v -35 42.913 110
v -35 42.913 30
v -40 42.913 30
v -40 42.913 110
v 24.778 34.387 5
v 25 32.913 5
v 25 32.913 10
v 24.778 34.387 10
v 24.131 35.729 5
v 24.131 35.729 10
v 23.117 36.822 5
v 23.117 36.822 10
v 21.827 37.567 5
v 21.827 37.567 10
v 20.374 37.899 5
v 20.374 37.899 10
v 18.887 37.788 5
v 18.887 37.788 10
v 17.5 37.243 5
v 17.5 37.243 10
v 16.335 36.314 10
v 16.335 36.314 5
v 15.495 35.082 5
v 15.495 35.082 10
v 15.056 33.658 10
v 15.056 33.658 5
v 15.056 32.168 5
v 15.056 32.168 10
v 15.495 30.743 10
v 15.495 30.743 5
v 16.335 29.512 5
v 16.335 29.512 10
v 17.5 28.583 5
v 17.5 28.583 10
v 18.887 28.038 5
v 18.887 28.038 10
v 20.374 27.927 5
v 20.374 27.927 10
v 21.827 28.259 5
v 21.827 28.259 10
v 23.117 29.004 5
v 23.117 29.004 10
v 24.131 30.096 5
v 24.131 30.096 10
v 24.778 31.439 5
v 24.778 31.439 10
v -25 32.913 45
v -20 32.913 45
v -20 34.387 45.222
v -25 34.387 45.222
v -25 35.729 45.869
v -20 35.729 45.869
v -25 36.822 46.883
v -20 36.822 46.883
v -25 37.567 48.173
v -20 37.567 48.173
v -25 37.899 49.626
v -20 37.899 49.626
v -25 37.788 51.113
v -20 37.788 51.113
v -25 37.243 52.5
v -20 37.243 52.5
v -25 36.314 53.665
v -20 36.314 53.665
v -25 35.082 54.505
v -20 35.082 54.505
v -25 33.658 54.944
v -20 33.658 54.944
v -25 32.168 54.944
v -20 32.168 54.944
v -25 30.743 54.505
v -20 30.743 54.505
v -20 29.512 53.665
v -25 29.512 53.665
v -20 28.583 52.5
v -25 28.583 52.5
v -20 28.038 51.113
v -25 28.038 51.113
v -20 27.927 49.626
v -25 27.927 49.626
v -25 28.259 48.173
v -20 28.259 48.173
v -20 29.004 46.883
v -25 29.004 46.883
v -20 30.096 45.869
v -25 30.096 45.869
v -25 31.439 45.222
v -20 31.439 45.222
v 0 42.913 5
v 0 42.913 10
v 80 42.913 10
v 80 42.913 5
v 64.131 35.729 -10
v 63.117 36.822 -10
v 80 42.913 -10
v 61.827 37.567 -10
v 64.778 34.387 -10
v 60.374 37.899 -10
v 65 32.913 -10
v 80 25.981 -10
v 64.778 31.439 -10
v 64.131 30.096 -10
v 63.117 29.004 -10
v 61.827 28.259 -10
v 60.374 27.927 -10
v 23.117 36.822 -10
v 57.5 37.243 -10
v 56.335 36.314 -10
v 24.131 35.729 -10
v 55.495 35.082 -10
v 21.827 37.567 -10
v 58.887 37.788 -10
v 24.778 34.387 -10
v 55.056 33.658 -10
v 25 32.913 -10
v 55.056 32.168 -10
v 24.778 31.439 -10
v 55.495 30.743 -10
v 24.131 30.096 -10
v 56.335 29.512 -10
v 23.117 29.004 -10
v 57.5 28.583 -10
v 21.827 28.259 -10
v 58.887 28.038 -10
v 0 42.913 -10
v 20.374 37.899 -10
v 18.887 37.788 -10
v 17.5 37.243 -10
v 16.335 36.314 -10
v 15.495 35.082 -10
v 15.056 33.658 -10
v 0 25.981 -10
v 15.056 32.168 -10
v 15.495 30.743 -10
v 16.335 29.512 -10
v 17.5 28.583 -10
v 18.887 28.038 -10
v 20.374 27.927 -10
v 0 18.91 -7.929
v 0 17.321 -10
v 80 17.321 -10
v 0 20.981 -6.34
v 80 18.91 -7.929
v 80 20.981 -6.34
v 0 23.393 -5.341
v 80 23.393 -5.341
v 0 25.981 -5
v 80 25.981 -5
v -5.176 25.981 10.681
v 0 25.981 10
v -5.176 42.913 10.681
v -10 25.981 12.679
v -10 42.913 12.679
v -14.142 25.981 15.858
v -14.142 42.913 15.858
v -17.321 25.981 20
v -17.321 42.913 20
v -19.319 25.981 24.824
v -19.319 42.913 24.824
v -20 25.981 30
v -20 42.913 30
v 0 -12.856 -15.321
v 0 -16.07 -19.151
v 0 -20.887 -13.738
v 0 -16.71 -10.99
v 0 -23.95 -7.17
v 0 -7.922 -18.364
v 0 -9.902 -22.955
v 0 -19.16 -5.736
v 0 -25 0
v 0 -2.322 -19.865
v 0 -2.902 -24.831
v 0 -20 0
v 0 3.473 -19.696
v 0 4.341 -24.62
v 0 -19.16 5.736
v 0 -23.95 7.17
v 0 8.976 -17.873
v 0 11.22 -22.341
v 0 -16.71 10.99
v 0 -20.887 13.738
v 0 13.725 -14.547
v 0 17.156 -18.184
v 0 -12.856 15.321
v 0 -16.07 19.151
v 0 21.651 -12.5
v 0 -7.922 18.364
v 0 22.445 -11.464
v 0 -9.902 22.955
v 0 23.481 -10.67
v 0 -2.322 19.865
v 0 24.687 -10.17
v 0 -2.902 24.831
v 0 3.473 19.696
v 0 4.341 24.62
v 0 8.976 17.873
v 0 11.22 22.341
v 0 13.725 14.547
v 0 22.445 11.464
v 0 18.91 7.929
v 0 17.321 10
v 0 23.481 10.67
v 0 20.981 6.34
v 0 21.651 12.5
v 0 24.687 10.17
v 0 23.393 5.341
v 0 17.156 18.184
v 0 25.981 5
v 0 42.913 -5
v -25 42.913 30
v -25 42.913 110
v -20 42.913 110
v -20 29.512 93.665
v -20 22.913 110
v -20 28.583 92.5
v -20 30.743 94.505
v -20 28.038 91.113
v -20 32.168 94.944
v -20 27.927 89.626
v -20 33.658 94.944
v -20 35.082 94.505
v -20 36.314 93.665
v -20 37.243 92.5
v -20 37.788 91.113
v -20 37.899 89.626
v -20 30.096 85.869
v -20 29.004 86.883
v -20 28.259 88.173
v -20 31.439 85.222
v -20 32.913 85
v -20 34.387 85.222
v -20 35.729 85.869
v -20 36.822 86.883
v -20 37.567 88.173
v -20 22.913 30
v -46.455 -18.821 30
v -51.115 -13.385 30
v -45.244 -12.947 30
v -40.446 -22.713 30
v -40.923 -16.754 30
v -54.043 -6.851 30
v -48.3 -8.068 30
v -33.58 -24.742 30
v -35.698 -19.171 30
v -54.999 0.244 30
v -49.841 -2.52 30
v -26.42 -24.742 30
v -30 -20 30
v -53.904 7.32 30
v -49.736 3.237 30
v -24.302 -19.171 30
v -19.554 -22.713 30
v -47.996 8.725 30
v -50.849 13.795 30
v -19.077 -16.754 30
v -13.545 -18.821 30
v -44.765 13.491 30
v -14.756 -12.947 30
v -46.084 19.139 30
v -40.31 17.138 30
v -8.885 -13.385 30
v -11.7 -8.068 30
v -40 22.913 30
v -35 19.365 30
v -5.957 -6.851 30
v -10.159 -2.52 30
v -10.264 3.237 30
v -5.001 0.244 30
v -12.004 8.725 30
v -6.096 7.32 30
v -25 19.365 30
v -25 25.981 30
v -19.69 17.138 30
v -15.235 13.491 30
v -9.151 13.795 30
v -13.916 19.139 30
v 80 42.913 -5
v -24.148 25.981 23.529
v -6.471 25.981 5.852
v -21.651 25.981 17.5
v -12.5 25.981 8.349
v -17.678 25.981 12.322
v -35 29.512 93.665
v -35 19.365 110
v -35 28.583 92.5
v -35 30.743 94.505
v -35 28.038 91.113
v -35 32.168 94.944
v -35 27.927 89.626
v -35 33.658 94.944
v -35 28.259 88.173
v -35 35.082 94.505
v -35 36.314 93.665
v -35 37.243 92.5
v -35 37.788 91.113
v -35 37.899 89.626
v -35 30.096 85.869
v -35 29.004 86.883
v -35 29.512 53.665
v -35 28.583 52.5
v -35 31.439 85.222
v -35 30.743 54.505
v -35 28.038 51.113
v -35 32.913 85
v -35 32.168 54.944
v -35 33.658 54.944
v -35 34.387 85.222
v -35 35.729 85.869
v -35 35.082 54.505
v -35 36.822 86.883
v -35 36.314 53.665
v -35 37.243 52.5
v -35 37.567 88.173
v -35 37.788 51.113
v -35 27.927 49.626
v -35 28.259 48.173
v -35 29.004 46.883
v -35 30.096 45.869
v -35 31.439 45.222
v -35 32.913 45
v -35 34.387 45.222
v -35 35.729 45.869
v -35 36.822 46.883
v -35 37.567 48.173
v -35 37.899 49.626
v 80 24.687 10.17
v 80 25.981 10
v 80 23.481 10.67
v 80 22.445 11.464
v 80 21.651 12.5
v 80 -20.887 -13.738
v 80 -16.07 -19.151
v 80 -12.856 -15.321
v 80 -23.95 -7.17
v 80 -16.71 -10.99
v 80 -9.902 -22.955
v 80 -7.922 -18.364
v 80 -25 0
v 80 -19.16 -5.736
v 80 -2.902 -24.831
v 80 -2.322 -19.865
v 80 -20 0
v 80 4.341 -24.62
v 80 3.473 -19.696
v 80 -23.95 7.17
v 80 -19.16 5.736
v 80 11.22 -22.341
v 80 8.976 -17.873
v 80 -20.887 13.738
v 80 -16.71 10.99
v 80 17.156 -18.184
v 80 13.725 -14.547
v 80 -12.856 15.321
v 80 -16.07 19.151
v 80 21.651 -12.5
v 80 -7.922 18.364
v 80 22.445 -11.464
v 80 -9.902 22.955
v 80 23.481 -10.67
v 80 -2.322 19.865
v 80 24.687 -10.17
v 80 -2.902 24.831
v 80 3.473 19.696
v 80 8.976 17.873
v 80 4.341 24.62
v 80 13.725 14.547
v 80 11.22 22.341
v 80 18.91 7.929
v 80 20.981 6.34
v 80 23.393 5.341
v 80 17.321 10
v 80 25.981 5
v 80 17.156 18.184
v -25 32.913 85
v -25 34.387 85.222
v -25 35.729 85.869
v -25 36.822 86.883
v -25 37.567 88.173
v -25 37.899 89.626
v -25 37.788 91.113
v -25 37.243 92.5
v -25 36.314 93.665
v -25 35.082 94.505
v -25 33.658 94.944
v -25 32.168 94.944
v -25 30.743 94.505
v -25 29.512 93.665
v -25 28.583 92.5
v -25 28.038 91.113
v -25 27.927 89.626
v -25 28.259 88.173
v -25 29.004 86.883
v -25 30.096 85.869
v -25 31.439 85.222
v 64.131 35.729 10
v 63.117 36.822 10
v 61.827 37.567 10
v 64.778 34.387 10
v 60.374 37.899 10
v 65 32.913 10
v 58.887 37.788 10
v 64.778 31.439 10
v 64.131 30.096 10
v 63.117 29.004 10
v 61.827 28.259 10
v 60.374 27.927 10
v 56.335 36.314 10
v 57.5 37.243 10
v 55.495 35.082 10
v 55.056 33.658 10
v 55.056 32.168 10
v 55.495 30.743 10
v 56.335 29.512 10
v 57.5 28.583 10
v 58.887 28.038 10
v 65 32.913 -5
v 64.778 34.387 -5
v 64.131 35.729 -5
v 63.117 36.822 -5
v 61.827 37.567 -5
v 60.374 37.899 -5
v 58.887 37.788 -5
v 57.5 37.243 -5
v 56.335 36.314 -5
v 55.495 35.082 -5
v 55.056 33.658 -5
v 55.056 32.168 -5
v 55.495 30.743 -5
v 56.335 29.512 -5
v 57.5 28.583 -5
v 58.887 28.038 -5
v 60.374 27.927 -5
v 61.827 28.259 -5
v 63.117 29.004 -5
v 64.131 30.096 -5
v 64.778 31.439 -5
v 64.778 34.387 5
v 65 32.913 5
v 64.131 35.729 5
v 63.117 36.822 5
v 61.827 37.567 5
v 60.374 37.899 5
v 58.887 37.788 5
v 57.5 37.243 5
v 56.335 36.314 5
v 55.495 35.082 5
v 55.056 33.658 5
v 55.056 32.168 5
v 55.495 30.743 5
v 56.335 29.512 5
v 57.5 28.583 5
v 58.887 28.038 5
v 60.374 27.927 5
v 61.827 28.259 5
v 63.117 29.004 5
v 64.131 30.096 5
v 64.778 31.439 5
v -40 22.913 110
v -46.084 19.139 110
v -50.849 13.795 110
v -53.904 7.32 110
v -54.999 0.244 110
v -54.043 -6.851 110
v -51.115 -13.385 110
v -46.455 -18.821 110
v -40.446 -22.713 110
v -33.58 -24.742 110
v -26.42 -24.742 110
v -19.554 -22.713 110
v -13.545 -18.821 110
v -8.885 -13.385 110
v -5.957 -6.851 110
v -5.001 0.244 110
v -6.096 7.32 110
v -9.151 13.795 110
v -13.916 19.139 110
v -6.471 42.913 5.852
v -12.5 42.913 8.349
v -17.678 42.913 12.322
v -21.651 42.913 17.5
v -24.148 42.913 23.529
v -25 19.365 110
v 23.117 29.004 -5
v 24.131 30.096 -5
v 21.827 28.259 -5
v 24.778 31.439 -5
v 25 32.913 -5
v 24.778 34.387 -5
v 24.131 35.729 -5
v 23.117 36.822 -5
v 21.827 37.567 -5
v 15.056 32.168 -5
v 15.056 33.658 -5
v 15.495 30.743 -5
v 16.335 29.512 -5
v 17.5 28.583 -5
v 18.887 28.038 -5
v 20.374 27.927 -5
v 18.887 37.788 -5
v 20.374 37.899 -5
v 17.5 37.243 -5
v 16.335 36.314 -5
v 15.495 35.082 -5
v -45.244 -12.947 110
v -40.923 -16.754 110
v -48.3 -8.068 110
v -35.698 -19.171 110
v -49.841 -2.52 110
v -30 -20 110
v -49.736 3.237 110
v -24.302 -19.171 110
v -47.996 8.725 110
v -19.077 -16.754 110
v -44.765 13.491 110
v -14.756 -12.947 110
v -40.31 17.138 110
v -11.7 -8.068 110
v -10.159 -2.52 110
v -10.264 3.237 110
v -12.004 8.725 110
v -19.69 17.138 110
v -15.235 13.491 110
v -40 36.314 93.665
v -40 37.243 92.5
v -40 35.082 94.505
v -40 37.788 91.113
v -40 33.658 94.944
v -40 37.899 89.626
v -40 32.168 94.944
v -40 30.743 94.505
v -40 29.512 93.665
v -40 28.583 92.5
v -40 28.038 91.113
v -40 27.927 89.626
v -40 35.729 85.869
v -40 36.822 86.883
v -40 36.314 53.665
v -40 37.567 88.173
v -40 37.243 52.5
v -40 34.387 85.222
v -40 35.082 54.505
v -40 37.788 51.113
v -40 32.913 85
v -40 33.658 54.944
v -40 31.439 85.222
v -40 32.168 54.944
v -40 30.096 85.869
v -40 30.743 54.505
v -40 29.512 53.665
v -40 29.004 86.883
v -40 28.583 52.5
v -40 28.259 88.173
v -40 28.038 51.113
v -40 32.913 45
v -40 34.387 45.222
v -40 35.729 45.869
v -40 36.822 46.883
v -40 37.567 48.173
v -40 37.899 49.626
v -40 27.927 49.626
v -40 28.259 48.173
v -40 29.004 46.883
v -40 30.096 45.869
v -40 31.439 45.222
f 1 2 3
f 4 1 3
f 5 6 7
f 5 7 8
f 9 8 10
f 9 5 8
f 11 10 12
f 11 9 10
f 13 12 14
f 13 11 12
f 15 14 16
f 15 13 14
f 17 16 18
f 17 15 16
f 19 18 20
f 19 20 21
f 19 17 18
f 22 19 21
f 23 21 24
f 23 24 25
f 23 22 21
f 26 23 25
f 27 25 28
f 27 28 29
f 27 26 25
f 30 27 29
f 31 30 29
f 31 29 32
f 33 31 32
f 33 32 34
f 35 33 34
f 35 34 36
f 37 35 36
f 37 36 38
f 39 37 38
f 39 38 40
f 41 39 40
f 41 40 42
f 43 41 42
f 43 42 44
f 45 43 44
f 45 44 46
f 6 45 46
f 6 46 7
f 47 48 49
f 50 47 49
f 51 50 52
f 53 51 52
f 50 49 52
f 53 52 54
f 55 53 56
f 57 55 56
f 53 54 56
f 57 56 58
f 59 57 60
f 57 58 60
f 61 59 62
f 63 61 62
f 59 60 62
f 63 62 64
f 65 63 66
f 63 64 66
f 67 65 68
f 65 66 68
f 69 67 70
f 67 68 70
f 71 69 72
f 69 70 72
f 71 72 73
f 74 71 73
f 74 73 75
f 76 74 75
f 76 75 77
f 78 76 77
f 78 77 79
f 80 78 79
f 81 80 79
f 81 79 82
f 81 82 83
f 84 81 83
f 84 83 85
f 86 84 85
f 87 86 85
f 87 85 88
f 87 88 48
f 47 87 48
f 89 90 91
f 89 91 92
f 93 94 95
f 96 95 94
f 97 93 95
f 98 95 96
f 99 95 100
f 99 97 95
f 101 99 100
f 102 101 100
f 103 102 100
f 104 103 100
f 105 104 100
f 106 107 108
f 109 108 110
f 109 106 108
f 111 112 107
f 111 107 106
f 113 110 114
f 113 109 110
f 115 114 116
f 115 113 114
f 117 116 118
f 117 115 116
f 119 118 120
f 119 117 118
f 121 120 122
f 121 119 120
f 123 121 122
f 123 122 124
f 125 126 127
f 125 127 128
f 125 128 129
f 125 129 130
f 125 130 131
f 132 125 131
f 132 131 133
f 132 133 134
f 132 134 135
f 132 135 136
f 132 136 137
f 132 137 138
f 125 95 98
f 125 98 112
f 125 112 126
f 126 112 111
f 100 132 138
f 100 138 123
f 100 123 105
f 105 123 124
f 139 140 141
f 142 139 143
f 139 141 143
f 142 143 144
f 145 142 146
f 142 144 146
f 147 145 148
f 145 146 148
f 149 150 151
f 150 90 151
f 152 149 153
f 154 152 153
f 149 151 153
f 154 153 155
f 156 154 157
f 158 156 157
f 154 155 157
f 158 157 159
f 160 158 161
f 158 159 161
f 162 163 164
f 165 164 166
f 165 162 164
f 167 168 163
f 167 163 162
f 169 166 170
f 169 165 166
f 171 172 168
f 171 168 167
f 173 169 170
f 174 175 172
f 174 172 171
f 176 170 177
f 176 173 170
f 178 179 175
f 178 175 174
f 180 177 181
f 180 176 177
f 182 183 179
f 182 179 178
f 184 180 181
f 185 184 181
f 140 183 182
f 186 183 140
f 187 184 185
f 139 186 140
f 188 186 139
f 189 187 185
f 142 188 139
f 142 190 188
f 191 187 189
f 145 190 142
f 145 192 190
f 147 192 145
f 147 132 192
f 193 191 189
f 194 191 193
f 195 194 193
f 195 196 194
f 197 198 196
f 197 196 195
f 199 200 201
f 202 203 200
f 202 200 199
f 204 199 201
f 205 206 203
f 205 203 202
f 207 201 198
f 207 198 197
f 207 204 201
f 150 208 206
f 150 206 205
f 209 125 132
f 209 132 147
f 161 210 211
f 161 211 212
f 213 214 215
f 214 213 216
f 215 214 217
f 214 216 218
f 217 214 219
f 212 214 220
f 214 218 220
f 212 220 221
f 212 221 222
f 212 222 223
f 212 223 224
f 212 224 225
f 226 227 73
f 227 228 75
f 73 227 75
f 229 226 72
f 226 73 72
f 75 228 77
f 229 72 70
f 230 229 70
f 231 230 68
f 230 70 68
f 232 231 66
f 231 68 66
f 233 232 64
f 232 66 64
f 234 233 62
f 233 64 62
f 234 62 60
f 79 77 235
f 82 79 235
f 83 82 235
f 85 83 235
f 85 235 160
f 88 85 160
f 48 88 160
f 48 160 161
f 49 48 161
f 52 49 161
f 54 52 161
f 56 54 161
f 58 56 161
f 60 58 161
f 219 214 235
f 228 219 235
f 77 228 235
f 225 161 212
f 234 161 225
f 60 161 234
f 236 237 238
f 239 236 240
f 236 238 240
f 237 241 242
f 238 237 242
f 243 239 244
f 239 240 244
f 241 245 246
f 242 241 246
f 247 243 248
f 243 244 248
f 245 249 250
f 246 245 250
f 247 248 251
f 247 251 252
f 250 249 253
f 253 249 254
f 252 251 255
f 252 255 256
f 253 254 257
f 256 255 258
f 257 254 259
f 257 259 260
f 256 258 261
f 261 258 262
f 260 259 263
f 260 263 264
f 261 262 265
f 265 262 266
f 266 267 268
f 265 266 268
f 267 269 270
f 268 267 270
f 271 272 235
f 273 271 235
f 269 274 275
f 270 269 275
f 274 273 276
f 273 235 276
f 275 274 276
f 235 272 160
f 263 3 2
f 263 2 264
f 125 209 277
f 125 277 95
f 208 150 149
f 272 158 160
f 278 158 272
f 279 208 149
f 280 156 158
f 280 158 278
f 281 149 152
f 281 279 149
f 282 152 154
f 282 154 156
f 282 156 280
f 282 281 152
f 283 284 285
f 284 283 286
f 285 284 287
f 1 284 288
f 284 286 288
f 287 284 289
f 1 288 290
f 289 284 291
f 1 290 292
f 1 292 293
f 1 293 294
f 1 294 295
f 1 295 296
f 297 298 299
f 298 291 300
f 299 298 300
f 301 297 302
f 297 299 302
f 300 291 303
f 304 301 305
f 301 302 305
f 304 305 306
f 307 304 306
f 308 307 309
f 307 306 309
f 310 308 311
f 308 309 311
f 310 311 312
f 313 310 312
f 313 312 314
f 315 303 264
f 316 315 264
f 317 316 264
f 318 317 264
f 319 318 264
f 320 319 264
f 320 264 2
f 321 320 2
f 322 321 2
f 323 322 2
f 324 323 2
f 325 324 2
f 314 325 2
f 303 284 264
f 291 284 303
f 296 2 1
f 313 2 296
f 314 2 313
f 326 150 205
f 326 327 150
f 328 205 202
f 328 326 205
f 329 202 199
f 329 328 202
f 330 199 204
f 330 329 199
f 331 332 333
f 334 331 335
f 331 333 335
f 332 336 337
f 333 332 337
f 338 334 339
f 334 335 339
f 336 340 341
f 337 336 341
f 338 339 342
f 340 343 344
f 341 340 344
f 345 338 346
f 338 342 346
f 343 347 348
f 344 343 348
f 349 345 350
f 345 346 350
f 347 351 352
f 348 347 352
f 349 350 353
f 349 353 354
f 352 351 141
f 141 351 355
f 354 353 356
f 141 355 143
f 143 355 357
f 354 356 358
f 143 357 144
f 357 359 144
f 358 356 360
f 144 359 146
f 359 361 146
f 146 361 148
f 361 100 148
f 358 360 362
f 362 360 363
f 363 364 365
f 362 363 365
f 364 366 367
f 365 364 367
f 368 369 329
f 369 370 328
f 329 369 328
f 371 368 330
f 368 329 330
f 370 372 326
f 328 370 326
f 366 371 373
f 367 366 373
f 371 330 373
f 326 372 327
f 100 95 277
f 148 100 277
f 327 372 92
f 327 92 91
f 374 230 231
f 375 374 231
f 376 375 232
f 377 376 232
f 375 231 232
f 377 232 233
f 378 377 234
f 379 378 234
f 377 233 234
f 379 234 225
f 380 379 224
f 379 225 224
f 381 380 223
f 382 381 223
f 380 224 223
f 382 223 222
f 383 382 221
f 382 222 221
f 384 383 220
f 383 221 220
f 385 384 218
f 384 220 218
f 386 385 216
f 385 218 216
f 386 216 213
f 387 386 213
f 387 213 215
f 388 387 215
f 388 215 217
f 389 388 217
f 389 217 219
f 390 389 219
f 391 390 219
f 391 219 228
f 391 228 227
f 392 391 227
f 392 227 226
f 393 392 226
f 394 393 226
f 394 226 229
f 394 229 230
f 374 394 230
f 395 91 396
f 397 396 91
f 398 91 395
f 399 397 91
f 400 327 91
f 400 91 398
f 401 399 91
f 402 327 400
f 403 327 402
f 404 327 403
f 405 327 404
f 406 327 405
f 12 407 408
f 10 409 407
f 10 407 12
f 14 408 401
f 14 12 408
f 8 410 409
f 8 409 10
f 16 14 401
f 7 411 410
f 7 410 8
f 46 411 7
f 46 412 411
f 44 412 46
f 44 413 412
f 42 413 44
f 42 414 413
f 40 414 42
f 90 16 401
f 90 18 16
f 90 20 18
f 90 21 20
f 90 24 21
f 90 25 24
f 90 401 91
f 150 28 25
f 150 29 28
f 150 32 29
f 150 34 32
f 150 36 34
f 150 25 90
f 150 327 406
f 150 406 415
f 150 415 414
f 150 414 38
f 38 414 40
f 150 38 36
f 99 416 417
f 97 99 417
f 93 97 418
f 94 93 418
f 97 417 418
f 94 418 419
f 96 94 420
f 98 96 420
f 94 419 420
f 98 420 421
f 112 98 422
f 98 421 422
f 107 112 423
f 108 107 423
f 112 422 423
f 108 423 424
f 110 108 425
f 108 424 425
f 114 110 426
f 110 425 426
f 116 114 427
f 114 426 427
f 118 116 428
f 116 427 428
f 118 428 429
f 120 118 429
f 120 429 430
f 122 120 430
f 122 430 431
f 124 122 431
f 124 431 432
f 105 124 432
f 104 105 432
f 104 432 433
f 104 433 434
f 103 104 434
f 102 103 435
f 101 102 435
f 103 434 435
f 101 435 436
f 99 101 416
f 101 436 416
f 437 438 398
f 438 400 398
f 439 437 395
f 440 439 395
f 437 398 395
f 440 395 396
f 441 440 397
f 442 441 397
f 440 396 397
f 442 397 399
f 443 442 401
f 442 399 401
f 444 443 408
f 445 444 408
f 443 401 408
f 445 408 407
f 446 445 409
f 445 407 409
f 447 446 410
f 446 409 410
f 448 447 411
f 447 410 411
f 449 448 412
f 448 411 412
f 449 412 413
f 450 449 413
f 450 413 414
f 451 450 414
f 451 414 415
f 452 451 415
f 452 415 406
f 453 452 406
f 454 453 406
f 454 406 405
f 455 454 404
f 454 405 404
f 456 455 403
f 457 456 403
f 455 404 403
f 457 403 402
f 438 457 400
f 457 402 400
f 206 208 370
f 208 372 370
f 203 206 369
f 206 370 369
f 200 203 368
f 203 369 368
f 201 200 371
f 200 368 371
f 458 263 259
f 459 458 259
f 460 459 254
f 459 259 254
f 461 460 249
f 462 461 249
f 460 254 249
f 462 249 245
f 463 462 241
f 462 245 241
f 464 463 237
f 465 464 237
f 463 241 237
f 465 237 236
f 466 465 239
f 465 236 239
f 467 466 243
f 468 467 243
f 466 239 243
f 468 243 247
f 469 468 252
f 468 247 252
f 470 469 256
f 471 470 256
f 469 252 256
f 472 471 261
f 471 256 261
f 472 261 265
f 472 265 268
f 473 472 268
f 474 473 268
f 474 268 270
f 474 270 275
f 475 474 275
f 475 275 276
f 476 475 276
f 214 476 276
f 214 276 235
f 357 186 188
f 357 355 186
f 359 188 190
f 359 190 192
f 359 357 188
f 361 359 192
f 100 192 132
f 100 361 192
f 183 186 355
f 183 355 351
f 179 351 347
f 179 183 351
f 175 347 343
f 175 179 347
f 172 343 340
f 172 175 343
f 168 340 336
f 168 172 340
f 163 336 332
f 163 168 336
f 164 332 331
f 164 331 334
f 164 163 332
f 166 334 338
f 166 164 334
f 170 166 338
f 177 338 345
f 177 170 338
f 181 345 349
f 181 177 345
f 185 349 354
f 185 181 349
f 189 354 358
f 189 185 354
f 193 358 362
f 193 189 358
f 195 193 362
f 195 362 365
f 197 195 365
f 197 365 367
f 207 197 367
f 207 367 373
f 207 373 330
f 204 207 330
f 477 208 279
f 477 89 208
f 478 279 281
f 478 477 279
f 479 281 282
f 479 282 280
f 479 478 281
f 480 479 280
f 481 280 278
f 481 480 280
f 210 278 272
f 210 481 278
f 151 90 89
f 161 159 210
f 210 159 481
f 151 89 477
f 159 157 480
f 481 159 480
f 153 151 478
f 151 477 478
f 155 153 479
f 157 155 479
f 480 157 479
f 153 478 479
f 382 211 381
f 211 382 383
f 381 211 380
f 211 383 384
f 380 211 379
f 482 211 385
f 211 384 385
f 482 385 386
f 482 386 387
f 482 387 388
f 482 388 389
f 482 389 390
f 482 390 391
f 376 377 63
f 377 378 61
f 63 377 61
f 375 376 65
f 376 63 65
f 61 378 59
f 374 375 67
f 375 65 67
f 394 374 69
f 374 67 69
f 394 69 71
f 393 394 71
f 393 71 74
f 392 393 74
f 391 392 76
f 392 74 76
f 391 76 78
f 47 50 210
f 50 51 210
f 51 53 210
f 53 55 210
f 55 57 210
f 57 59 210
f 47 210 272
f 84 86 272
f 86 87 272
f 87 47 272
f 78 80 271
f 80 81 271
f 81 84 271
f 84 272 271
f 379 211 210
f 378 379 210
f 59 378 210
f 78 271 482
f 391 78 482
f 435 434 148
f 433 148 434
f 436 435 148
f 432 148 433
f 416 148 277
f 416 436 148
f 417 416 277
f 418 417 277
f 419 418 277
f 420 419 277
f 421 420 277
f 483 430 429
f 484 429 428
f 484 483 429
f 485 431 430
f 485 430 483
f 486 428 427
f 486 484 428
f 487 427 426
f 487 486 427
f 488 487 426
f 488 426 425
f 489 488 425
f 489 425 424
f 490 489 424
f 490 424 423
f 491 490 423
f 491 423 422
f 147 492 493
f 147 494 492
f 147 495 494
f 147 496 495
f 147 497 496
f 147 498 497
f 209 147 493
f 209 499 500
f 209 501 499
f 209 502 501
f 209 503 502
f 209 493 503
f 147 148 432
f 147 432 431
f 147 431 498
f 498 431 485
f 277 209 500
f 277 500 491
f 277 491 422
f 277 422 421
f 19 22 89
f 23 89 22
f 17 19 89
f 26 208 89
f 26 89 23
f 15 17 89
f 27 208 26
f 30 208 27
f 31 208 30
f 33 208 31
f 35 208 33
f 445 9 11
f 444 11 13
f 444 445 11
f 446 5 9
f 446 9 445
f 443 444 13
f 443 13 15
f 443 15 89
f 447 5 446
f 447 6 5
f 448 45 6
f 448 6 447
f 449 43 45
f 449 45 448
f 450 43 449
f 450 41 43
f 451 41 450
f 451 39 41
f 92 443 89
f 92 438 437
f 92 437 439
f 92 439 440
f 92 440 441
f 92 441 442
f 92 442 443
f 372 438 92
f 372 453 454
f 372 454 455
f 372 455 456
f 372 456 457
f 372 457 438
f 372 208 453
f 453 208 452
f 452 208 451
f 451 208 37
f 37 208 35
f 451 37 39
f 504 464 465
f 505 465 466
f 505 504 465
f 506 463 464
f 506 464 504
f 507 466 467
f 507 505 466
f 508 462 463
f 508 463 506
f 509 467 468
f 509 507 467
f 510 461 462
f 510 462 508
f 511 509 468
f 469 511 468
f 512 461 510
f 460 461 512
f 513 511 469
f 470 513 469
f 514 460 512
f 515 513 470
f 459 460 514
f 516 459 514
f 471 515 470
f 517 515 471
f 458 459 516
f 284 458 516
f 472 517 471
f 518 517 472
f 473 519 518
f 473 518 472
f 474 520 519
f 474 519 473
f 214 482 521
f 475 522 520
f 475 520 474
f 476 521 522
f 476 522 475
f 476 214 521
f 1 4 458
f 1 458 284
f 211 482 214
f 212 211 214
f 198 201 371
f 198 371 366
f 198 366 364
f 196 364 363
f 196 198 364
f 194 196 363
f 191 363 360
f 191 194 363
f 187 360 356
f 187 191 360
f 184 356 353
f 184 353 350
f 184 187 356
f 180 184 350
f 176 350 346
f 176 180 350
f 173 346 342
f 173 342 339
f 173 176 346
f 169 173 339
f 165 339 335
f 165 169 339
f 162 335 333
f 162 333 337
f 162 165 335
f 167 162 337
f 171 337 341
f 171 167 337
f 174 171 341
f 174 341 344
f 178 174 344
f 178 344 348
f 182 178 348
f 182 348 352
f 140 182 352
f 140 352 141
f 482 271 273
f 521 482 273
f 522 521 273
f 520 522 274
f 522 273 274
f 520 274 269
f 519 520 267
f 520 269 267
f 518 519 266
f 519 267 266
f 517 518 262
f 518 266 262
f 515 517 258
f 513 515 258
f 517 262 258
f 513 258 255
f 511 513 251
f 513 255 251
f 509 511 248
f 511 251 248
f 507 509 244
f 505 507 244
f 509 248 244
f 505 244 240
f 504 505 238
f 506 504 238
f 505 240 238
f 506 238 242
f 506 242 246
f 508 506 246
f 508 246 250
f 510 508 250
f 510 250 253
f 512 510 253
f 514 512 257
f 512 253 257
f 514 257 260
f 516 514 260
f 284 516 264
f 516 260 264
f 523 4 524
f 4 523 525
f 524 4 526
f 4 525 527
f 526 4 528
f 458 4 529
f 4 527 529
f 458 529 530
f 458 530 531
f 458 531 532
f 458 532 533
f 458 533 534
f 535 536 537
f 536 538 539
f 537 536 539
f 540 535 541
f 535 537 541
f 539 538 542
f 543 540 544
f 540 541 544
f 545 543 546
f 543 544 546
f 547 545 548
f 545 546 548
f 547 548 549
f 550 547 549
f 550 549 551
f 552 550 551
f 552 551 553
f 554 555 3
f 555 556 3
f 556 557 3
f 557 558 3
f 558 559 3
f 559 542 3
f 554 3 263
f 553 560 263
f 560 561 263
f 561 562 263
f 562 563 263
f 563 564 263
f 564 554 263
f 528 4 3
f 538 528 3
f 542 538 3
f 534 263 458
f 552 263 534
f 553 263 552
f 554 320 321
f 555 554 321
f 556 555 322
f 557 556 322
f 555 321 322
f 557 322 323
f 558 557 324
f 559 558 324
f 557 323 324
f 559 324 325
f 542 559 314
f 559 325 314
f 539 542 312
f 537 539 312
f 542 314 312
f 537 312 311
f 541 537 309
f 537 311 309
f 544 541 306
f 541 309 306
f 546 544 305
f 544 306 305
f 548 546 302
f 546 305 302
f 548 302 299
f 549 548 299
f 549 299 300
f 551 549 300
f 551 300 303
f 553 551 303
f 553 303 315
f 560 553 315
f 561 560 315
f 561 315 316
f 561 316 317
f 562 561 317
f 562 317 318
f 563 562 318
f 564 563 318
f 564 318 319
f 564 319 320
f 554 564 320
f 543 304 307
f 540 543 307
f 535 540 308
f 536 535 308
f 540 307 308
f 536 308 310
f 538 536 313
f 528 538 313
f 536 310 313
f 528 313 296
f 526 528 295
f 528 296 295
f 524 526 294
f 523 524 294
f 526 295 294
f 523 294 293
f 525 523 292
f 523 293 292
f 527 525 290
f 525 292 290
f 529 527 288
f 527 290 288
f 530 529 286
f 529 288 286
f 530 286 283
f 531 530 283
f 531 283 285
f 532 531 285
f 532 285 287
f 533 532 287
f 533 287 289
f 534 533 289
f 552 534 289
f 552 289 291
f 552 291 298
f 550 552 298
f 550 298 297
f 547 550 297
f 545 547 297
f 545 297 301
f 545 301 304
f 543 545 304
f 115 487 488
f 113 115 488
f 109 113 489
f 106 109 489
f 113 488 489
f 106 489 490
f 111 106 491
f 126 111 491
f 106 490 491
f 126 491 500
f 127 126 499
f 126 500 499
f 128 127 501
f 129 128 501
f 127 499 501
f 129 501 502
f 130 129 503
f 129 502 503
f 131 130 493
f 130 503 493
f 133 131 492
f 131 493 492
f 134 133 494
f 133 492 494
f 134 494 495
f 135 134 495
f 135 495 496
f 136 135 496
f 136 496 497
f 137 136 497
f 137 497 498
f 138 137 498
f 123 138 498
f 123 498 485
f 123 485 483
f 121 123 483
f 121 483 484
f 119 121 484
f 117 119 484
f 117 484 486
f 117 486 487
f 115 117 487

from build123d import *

# Parameters (mm, degrees)
BOSS_EXTRUDE1_DEPTH = 80
SKETCH2_R           = 5
CUT_EXTRUDE1_DEPTH  = 10
FILLET2_R           = 5
FILLET3_R           = 10
BOSS_EXTRUDE2_START = 25.98076
BOSS_EXTRUDE2_DEPTH = 16.932117
FILLET4_R           = 20
FILLET5_R           = 25
SKETCH6_W           = 5
SKETCH6_H           = 16.932118475
BOSS_EXTRUDE4_DEPTH = 80
SKETCH7_R           = 5
CUT_EXTRUDE2_DEPTH  = 40


with BuildPart() as part:
    # Sketch1 → Boss-Extrude1 (new body)
    with BuildSketch(Plane(origin=(0, 0, 0), x_dir=(0, 0, -1), z_dir=(1, 0, 0))):
        with BuildLine():
            Line((-10, 22.912878475), (-10, 42.912878475))
            Line((-10, 42.912878475), (-5, 42.912878475))
            Line((-5, 42.912878475), (-5, 19.364916731))
            ThreePointArc((-5, 19.364916731), (0, -20), (5, 19.364916731))
            Line((5, 19.364916731), (5, 42.912878475))
            Line((5, 42.912878475), (10, 42.912878475))
            Line((10, 42.912878475), (10, 22.912878475))
            ThreePointArc((10, 22.912878475), (0, -25), (-10, 22.912878475))
        make_face()
    extrude(amount=BOSS_EXTRUDE1_DEPTH)

    # Sketch2 → Cut-Extrude1 (cut, symmetric)
    with BuildSketch(Plane.XY):
        with Locations((20, 32.912878475)):
            Circle(SKETCH2_R)
        with Locations((60, 32.912878475)):
            Circle(SKETCH2_R)
    extrude(amount=CUT_EXTRUDE1_DEPTH, both=True, mode=Mode.SUBTRACT)

    # Fillet2
    fillet2_edges = [part.edges().sort_by_distance(p)[0] for p in [
        (40, 22.912878475, -10),
        (40, 22.912878475, 10),
    ]]
    fillet(fillet2_edges, radius=FILLET2_R)

    # Fillet3
    fillet3_edges = [part.edges().sort_by_distance(p)[0] for p in [
        (40, 19.364916731, 5),
        (40, 19.364916731, -5),
    ]]
    fillet(fillet3_edges, radius=FILLET3_R)

    # Sketch3 → Boss-Extrude2 (add)
    with BuildSketch(Plane(origin=(0, 0, 0), x_dir=(1, 0, 0), z_dir=(0, 1, 0)).offset(BOSS_EXTRUDE2_START)):
        Polygon((0, -10), (-20, -10), (-20, -30), (-25, -30), (-25, -5), (0, -5), align=None)
    extrude(amount=BOSS_EXTRUDE2_DEPTH)

    # Fillet4
    fillet4_edges = [part.edges().sort_by_distance(p)[0] for p in [
        (-20, 34.4468185, 10),
    ]]
    fillet(fillet4_edges, radius=FILLET4_R - 0.0001)  # a hair under: the kernel refuses the full size

    # Fillet5
    fillet5_edges = [part.edges().sort_by_distance(p)[0] for p in [
        (-25, 34.4468185, 5),
    ]]
    fillet(fillet5_edges, radius=FILLET5_R - 0.0001)  # a hair under: the kernel refuses the full size

    # Sketch6 → Boss-Extrude4 (add)
    with BuildSketch(Plane.XY.offset(30)):
        with BuildLine():
            Line((-20, 25.98076), (-25, 25.98076))
            Line((-25, 25.98076), (-25, 19.364916731))
            ThreePointArc((-25, 19.364916731), (-30, -20), (-35, 19.364916731))
            Line((-35, 19.364916731), (-35, 42.912878475))
            Line((-35, 42.912878475), (-40, 42.912878475))
            Line((-40, 42.912878475), (-40, 22.912878475))
            ThreePointArc((-40, 22.912878475), (-30, -25), (-20, 22.912878475))
            Line((-20, 22.912878475), (-20, 25.98076))
        make_face()
        with Locations((-22.5, 34.446819238)):
            Rectangle(SKETCH6_W, SKETCH6_H)
    extrude(amount=BOSS_EXTRUDE4_DEPTH)

    # Sketch7 → Cut-Extrude2 (cut)
    with BuildSketch(Plane(origin=(0, 0, 0), x_dir=(0, 0, -1), z_dir=(1, 0, 0))):
        with Locations((-90, 32.912878475)):
            Circle(SKETCH7_R)
        with Locations((-50, 32.912878475)):
            Circle(SKETCH7_R)
    extrude(amount=-CUT_EXTRUDE2_DEPTH, mode=Mode.SUBTRACT)


solid = part.part
